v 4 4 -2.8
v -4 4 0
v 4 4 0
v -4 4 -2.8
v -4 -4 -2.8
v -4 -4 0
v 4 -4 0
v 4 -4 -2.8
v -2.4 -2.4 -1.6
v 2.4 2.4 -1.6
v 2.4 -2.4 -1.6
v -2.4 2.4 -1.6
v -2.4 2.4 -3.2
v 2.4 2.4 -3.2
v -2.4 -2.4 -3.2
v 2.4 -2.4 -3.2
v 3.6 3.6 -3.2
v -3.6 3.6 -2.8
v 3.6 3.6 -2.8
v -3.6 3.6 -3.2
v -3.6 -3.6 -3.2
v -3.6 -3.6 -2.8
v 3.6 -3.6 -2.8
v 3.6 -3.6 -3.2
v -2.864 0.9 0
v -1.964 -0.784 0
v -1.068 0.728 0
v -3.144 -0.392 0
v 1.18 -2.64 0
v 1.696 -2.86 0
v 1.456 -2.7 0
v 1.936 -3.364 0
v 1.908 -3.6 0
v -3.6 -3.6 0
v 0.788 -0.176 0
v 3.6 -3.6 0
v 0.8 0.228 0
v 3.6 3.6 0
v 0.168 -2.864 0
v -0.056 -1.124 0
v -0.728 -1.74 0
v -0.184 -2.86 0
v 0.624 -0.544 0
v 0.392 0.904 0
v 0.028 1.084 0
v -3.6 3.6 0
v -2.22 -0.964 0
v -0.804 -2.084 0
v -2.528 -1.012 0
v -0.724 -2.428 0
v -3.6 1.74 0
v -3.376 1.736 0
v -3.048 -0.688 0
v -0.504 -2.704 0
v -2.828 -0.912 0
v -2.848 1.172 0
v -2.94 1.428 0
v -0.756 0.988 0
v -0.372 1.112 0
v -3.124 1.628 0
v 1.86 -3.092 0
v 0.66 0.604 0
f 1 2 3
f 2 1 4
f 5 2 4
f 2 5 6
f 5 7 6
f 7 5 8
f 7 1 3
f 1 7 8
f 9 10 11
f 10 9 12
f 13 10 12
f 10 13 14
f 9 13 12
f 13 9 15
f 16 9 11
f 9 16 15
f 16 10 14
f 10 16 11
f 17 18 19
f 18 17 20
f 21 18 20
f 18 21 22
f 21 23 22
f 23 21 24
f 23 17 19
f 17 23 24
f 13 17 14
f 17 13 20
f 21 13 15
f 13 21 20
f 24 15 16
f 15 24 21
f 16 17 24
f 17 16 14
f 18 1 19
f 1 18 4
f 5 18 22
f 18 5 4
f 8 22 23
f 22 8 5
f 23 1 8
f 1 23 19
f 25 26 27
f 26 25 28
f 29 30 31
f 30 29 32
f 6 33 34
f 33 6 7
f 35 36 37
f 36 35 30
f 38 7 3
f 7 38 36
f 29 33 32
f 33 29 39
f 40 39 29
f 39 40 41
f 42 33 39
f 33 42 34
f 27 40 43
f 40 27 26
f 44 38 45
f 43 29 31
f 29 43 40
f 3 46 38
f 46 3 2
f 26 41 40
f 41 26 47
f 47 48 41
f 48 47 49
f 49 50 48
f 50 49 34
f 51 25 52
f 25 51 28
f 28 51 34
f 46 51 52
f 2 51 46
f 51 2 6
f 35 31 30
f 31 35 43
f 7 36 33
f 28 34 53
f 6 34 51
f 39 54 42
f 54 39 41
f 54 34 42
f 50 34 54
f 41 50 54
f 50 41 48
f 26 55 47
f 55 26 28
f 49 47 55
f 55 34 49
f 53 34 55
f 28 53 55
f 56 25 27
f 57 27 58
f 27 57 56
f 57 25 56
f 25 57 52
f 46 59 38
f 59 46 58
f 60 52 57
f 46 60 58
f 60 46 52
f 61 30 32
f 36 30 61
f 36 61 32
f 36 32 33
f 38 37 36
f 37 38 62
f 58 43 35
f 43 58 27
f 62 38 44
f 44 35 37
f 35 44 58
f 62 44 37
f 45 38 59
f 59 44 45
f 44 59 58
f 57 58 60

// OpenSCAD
// file: ../p/box5.scad
use <../lib.scad>
function ldraw_lib__box5() = [
// 0 Box with 5 Faces and All Edges
// 0 Name: box5.dat
// 0 Author: James Jessiman
// 0 !LDRAW_ORG Primitive UPDATE 2012-01
// 0 !LICENSE Licensed under CC BY 2.0 and CC BY 4.0 : see CAreadme.txt
// 
// 0 BFC CERTIFY CCW
  [0,"BFC","CERTIFY"],
  [0,"BFC","CCW"],
// 
// 0 !HISTORY 2002-04-03 [sbliss] Modified for BFC compliance
// 0 !HISTORY 2002-04-25 [PTadmin] Official Update 2002-02
// 0 !HISTORY 2007-06-24 [PTadmin] Header formatted for Contributor Agreement
// 0 !HISTORY 2008-07-01 [PTadmin] Official Update 2008-01
// 0 !HISTORY 2012-02-16 [Philo] Changed to CCW
// 0 !HISTORY 2012-03-30 [PTadmin] Official Update 2012-01
// 
// 
// 2 24 1 1 1 -1 1 1
  [2,24,1,1,1,-1,1,1],
// 2 24 -1 1 1 -1 1 -1
  [2,24,-1,1,1,-1,1,-1],
// 2 24 -1 1 -1 1 1 -1
  [2,24,-1,1,-1,1,1,-1],
// 2 24 1 1 -1 1 1 1
  [2,24,1,1,-1,1,1,1],
// 2 24 1 0 1 -1 0 1
  [2,24,1,0,1,-1,0,1],
// 2 24 -1 0 1 -1 0 -1
  [2,24,-1,0,1,-1,0,-1],
// 2 24 -1 0 -1 1 0 -1
  [2,24,-1,0,-1,1,0,-1],
// 2 24 1 0 -1 1 0 1
  [2,24,1,0,-1,1,0,1],
// 2 24 1 0 1 1 1 1
  [2,24,1,0,1,1,1,1],
// 2 24 -1 0 1 -1 1 1
  [2,24,-1,0,1,-1,1,1],
// 2 24 1 0 -1 1 1 -1
  [2,24,1,0,-1,1,1,-1],
// 2 24 -1 0 -1 -1 1 -1
  [2,24,-1,0,-1,-1,1,-1],
// 4 16 -1 1 1 1 1 1 1 1 -1 -1 1 -1
  [4,16,-1,1,1,1,1,1,1,1,-1,-1,1,-1],
// 4 16 -1 1 1 -1 0 1 1 0 1 1 1 1
  [4,16,-1,1,1,-1,0,1,1,0,1,1,1,1],
// 4 16 -1 1 -1 -1 0 -1 -1 0 1 -1 1 1
  [4,16,-1,1,-1,-1,0,-1,-1,0,1,-1,1,1],
// 4 16 1 1 -1 1 0 -1 -1 0 -1 -1 1 -1
  [4,16,1,1,-1,1,0,-1,-1,0,-1,-1,1,-1],
// 4 16 1 1 1 1 0 1 1 0 -1 1 1 -1
  [4,16,1,1,1,1,0,1,1,0,-1,1,1,-1],
];
module ldraw_lib__box5(step=0, col=false, unit=2/5, alt=false, line=0.2, solid=!$preview)
    makepoly(ldraw_lib__box5(), step=step, col=col, unit=unit, alt=alt, line=line, solid=solid);
ldraw_lib__box5(line=0.2);
// file: ../p/box4.scad
use <../lib.scad>
function ldraw_lib__box4() = [
// 0 Box with 4 Faces (2 Parallel Pairs) and All Edges
// 0 Name: box4.dat
// 0 Author: James Jessiman
// 0 !LDRAW_ORG Primitive UPDATE 2012-01
// 0 !LICENSE Licensed under CC BY 2.0 and CC BY 4.0 : see CAreadme.txt
// 
// 0 BFC CERTIFY CCW
  [0,"BFC","CERTIFY"],
  [0,"BFC","CCW"],
// 
// 0 !HISTORY 2002-04-03 [sbliss] Modified for BFC compliance
// 0 !HISTORY 2002-04-25 [PTadmin] Official Update 2002-02
// 0 !HISTORY 2007-06-24 [PTadmin] Header formatted for Contributor Agreement
// 0 !HISTORY 2008-07-01 [PTadmin] Official Update 2008-01
// 0 !HISTORY 2012-02-16 [Philo] Changed to CCW
// 0 !HISTORY 2012-03-30 [PTadmin] Official Update 2012-01
// 
// 
// 2 24 1 1 1 -1 1 1
  [2,24,1,1,1,-1,1,1],
// 2 24 -1 1 1 -1 1 -1
  [2,24,-1,1,1,-1,1,-1],
// 2 24 -1 1 -1 1 1 -1
  [2,24,-1,1,-1,1,1,-1],
// 2 24 1 1 -1 1 1 1
  [2,24,1,1,-1,1,1,1],
// 2 24 1 0 1 -1 0 1
  [2,24,1,0,1,-1,0,1],
// 2 24 -1 0 1 -1 0 -1
  [2,24,-1,0,1,-1,0,-1],
// 2 24 -1 0 -1 1 0 -1
  [2,24,-1,0,-1,1,0,-1],
// 2 24 1 0 -1 1 0 1
  [2,24,1,0,-1,1,0,1],
// 2 24 1 0 1 1 1 1
  [2,24,1,0,1,1,1,1],
// 2 24 -1 0 1 -1 1 1
  [2,24,-1,0,1,-1,1,1],
// 2 24 1 0 -1 1 1 -1
  [2,24,1,0,-1,1,1,-1],
// 2 24 -1 0 -1 -1 1 -1
  [2,24,-1,0,-1,-1,1,-1],
// 4 16 -1 1 1 -1 0 1 1 0 1 1 1 1
  [4,16,-1,1,1,-1,0,1,1,0,1,1,1,1],
// 4 16 -1 1 -1 -1 0 -1 -1 0 1 -1 1 1
  [4,16,-1,1,-1,-1,0,-1,-1,0,1,-1,1,1],
// 4 16 1 1 -1 1 0 -1 -1 0 -1 -1 1 -1
  [4,16,1,1,-1,1,0,-1,-1,0,-1,-1,1,-1],
// 4 16 1 1 1 1 0 1 1 0 -1 1 1 -1
  [4,16,1,1,1,1,0,1,1,0,-1,1,1,-1],
];
module ldraw_lib__box4(step=0, col=false, unit=2/5, alt=false, line=0.2, solid=!$preview)
    makepoly(ldraw_lib__box4(), step=step, col=col, unit=unit, alt=alt, line=line, solid=solid);
ldraw_lib__box4(line=0.2);
// file: s/3070bs01.scad
use <../../lib.scad>
use <../../p/box4.scad>
use <../../p/box5.scad>
function ldraw_lib__s__3070bs01() = [
// 0 ~Tile  1 x  1 with Groove without Top Face
// 0 Name: s\3070bs01.dat
// 0 Author: Chris Dee [cwdee]
// 0 !LDRAW_ORG Subpart UPDATE 2009-02
// 0 !LICENSE Licensed under CC BY 2.0 and CC BY 4.0 : see CAreadme.txt
// 
// 0 BFC CERTIFY CCW
  [0,"BFC","CERTIFY"],
  [0,"BFC","CCW"],
// 
// 0 !HISTORY 2009-09-03 [PTadmin] Official Update 2009-02
// 
// 
// 1 16 0 0 0 10 0 0 0 7 0 0 0 10 box4.dat
  [1,16,0,0,0,10,0,0,0,7,0,0,0,10, ldraw_lib__box4()],
// 0 BFC INVERTNEXT
  [0,"BFC","INVERTNEXT"],
// 1 16 0 8 0 6 0 0 0 -4 0 0 0 6 box5.dat
  [1,16,0,8,0,6,0,0,0,-4,0,0,0,6, ldraw_lib__box5()],
// 1 16 0 7 0 9 0 0 0 1 0 0 0 9 box4.dat
  [1,16,0,7,0,9,0,0,0,1,0,0,0,9, ldraw_lib__box4()],
// 
// 4 16 9 8 9 6 8 6 -6 8 6 -9 8 9
  [4,16,9,8,9,6,8,6,-6,8,6,-9,8,9],
// 4 16 -9 8 9 -6 8 6 -6 8 -6 -9 8 -9
  [4,16,-9,8,9,-6,8,6,-6,8,-6,-9,8,-9],
// 4 16 -9 8 -9 -6 8 -6 6 8 -6 9 8 -9
  [4,16,-9,8,-9,-6,8,-6,6,8,-6,9,8,-9],
// 4 16 9 8 -9 6 8 -6 6 8 6 9 8 9
  [4,16,9,8,-9,6,8,-6,6,8,6,9,8,9],
// 
// 4 16 10 7 10 9 7 9 -9 7 9 -10 7 10
  [4,16,10,7,10,9,7,9,-9,7,9,-10,7,10],
// 4 16 -10 7 10 -9 7 9 -9 7 -9 -10 7 -10
  [4,16,-10,7,10,-9,7,9,-9,7,-9,-10,7,-10],
// 4 16 -10 7 -10 -9 7 -9 9 7 -9 10 7 -10
  [4,16,-10,7,-10,-9,7,-9,9,7,-9,10,7,-10],
// 4 16 10 7 -10 9 7 -9 9 7 9 10 7 10
  [4,16,10,7,-10,9,7,-9,9,7,9,10,7,10],
// 0
];
module ldraw_lib__s__3070bs01(step=0, col=false, unit=2/5, alt=false, line=0.2, solid=!$preview)
    makepoly(ldraw_lib__s__3070bs01(), step=step, col=col, unit=unit, alt=alt, line=line, solid=solid);
ldraw_lib__s__3070bs01(line=0.2);
// main file
use <../lib.scad>
use <s/3070bs01.scad>
function ldraw_lib__3070bp0t() = [
// 0 Tile  1 x  1 with Bright Pink Splotch on Dark Turquoise Background Pattern
// 0 Name: 3070bp0t.dat
// 0 Author: Philippe Hurbain [Philo]
// 0 !LDRAW_ORG Part UPDATE 2022-01
// 0 !LICENSE Licensed under CC BY 2.0 and CC BY 4.0 : see CAreadme.txt
// 
// 0 BFC CERTIFY CCW
  [0,"BFC","CERTIFY"],
  [0,"BFC","CCW"],
// 
// 0 !KEYWORDS Bricklink 3070bpb151, Dots
// 
// 0 !HISTORY 2022-01-14 [PTadmin] Official Update 2022-01
// 
// 
// 1 16 0 0 0 1 0 0 0 1 0 0 0 1 s\3070bs01.dat
  [1,16,0,0,0,1,0,0,0,1,0,0,0,1, ldraw_lib__s__3070bs01()],
// 4 3 -7.16 0 2.25 -7.86 0 -0.98 -4.91 0 -1.96 -2.67 0 1.82
  [4,3,-7.16,0,2.25,-7.86,0,-0.98,-4.91,0,-1.96,-2.67,0,1.82],
// 4 29 3.64 0 -6.75 2.95 0 -6.6 4.84 0 -8.41 4.24 0 -7.15
  [4,29,3.64,0,-6.75,2.95,0,-6.6,4.84,0,-8.41,4.24,0,-7.15],
// 4 16 -10 0 -10 10 0 -10 4.77 0 -9 -9 0 -9
  [4,16,-10,0,-10,10,0,-10,4.77,0,-9,-9,0,-9],
// 4 3 1.97 0 -0.44 4.24 0 -7.15 9 0 -9 2 0 0.57
  [4,3,1.97,0,-0.44,4.24,0,-7.15,9,0,-9,2,0,0.57],
// 4 16 9 0 9 9 0 -9 10 0 -10 10 0 10
  [4,16,9,0,9,9,0,-9,10,0,-10,10,0,10],
// 4 29 2.95 0 -6.6 0.42 0 -7.16 4.77 0 -9 4.84 0 -8.41
  [4,29,2.95,0,-6.6,0.42,0,-7.16,4.77,0,-9,4.84,0,-8.41],
// 4 3 -0.14 0 -2.81 -1.82 0 -4.35 0.42 0 -7.16 2.95 0 -6.6
  [4,3,-0.14,0,-2.81,-1.82,0,-4.35,0.42,0,-7.16,2.95,0,-6.6],
// 4 29 -0.46 0 -7.15 -9 0 -9 4.77 0 -9 0.42 0 -7.16
  [4,29,-0.46,0,-7.15,-9,0,-9,4.77,0,-9,0.42,0,-7.16],
// 4 29 -2.67 0 1.82 -4.91 0 -1.96 -0.14 0 -2.81 1.56 0 -1.36
  [4,29,-2.67,0,1.82,-4.91,0,-1.96,-0.14,0,-2.81,1.56,0,-1.36],
// 3 3 0.98 0 2.26 9 0 9 0.07 0 2.71
  [3,3,0.98,0,2.26,9,0,9,0.07,0,2.71],
// 4 3 1.56 0 -1.36 -0.14 0 -2.81 2.95 0 -6.6 3.64 0 -6.75
  [4,3,1.56,0,-1.36,-0.14,0,-2.81,2.95,0,-6.6,3.64,0,-6.75],
// 4 16 -10 0 10 -9 0 9 9 0 9 10 0 10
  [4,16,-10,0,10,-9,0,9,9,0,9,10,0,10],
// 4 29 -1.82 0 -4.35 -0.14 0 -2.81 -4.91 0 -1.96 -5.55 0 -2.41
  [4,29,-1.82,0,-4.35,-0.14,0,-2.81,-4.91,0,-1.96,-5.55,0,-2.41],
// 4 29 -2.01 0 -5.21 -1.82 0 -4.35 -5.55 0 -2.41 -6.32 0 -2.53
  [4,29,-2.01,0,-5.21,-1.82,0,-4.35,-5.55,0,-2.41,-6.32,0,-2.53],
// 4 29 -1.81 0 -6.07 -2.01 0 -5.21 -6.32 0 -2.53 -9 0 -9
  [4,29,-1.81,0,-6.07,-2.01,0,-5.21,-6.32,0,-2.53,-9,0,-9],
// 4 29 -9 0 4.35 -7.86 0 -0.98 -7.16 0 2.25 -8.44 0 4.34
  [4,29,-9,0,4.35,-7.86,0,-0.98,-7.16,0,2.25,-8.44,0,4.34],
// 3 29 -7.86 0 -0.98 -9 0 4.35 -9 0 -9
  [3,29,-7.86,0,-0.98,-9,0,4.35,-9,0,-9],
// 3 3 -9 0 9 -9 0 4.35 -8.44 0 4.34
  [3,3,-9,0,9,-9,0,4.35,-8.44,0,4.34],
// 4 16 -9 0 4.35 -9 0 9 -10 0 10 -10 0 -10
  [4,16,-9,0,4.35,-9,0,9,-10,0,10,-10,0,-10],
// 4 3 1.97 0 -0.44 1.56 0 -1.36 3.64 0 -6.75 4.24 0 -7.15
  [4,3,1.97,0,-0.44,1.56,0,-1.36,3.64,0,-6.75,4.24,0,-7.15],
// 3 16 10 0 -10 9 0 -9 4.77 0 -9
  [3,16,10,0,-10,9,0,-9,4.77,0,-9],
// 3 29 -7.86 0 -0.98 -9 0 -9 -7.62 0 -1.72
  [3,29,-7.86,0,-0.98,-9,0,-9,-7.62,0,-1.72],
// 3 16 -10 0 -10 -9 0 -9 -9 0 4.35
  [3,16,-10,0,-10,-9,0,-9,-9,0,4.35],
// 4 3 -0.46 0 -7.15 0.42 0 -7.16 -1.82 0 -4.35 -1.26 0 -6.76
  [4,3,-0.46,0,-7.15,0.42,0,-7.16,-1.82,0,-4.35,-1.26,0,-6.76],
// 3 29 -1.26 0 -6.76 -9 0 -9 -0.46 0 -7.15
  [3,29,-1.26,0,-6.76,-9,0,-9,-0.46,0,-7.15],
// 3 29 -1.81 0 -6.07 -9 0 -9 -1.26 0 -6.76
  [3,29,-1.81,0,-6.07,-9,0,-9,-1.26,0,-6.76],
// 4 3 -1.81 0 -6.07 -1.26 0 -6.76 -1.82 0 -4.35 -2.01 0 -5.21
  [4,3,-1.81,0,-6.07,-1.26,0,-6.76,-1.82,0,-4.35,-2.01,0,-5.21],
// 4 3 -5.55 0 -2.41 -4.91 0 -1.96 -7.86 0 -0.98 -7.07 0 -2.28
  [4,3,-5.55,0,-2.41,-4.91,0,-1.96,-7.86,0,-0.98,-7.07,0,-2.28],
// 3 3 -6.32 0 -2.53 -5.55 0 -2.41 -7.07 0 -2.28
  [3,3,-6.32,0,-2.53,-5.55,0,-2.41,-7.07,0,-2.28],
// 3 29 -7.07 0 -2.28 -9 0 -9 -6.32 0 -2.53
  [3,29,-7.07,0,-2.28,-9,0,-9,-6.32,0,-2.53],
// 3 29 -7.62 0 -1.72 -9 0 -9 -7.07 0 -2.28
  [3,29,-7.62,0,-1.72,-9,0,-9,-7.07,0,-2.28],
// 3 3 -7.86 0 -0.98 -7.62 0 -1.72 -7.07 0 -2.28
  [3,3,-7.86,0,-0.98,-7.62,0,-1.72,-7.07,0,-2.28],
// 3 3 -7.12 0 2.93 -7.16 0 2.25 -2.67 0 1.82
  [3,3,-7.12,0,2.93,-7.16,0,2.25,-2.67,0,1.82],
// 4 3 -7.35 0 3.57 -7.12 0 2.93 -2.67 0 1.82 -1.89 0 2.47
  [4,3,-7.35,0,3.57,-7.12,0,2.93,-2.67,0,1.82,-1.89,0,2.47],
// 4 29 -8.44 0 4.34 -7.16 0 2.25 -7.12 0 2.93 -7.35 0 3.57
  [4,29,-8.44,0,4.34,-7.16,0,2.25,-7.12,0,2.93,-7.35,0,3.57],
// 4 3 -0.93 0 2.78 9 0 9 -9 0 9 -1.89 0 2.47
  [4,3,-0.93,0,2.78,9,0,9,-9,0,9,-1.89,0,2.47],
// 3 29 -7.81 0 4.07 -8.44 0 4.34 -7.35 0 3.57
  [3,29,-7.81,0,4.07,-8.44,0,4.34,-7.35,0,3.57],
// 4 3 -9 0 9 -8.44 0 4.34 -7.81 0 4.07 -1.89 0 2.47
  [4,3,-9,0,9,-8.44,0,4.34,-7.81,0,4.07,-1.89,0,2.47],
// 3 29 4.65 0 -7.73 4.24 0 -7.15 4.84 0 -8.41
  [3,29,4.65,0,-7.73,4.24,0,-7.15,4.84,0,-8.41],
// 3 3 9 0 -9 4.24 0 -7.15 4.65 0 -7.73
  [3,3,9,0,-9,4.24,0,-7.15,4.65,0,-7.73],
// 3 3 9 0 -9 4.65 0 -7.73 4.84 0 -8.41
  [3,3,9,0,-9,4.65,0,-7.73,4.84,0,-8.41],
// 3 3 9 0 -9 4.84 0 -8.41 4.77 0 -9
  [3,3,9,0,-9,4.84,0,-8.41,4.77,0,-9],
// 4 3 2 0 0.57 9 0 -9 9 0 9 1.65 0 1.51
  [4,3,2,0,0.57,9,0,-9,9,0,9,1.65,0,1.51],
// 4 29 -1.89 0 2.47 -2.67 0 1.82 1.56 0 -1.36 1.97 0 -0.44
  [4,29,-1.89,0,2.47,-2.67,0,1.82,1.56,0,-1.36,1.97,0,-0.44],
// 3 3 1.65 0 1.51 9 0 9 0.98 0 2.26
  [3,3,1.65,0,1.51,9,0,9,0.98,0,2.26],
// 4 29 1.97 0 -0.44 2 0 0.57 0.98 0 2.26 -1.89 0 2.47
  [4,29,1.97,0,-0.44,2,0,0.57,0.98,0,2.26,-1.89,0,2.47],
// 3 29 1.65 0 1.51 0.98 0 2.26 2 0 0.57
  [3,29,1.65,0,1.51,0.98,0,2.26,2,0,0.57],
// 3 3 0.07 0 2.71 9 0 9 -0.93 0 2.78
  [3,3,0.07,0,2.71,9,0,9,-0.93,0,2.78],
// 4 29 -1.89 0 2.47 0.98 0 2.26 0.07 0 2.71 -0.93 0 2.78
  [4,29,-1.89,0,2.47,0.98,0,2.26,0.07,0,2.71,-0.93,0,2.78],
// 3 3 -7.35 0 3.57 -1.89 0 2.47 -7.81 0 4.07
  [3,3,-7.35,0,3.57,-1.89,0,2.47,-7.81,0,4.07],
];
module ldraw_lib__3070bp0t(step=0, col=false, unit=2/5, alt=false, line=0.2, solid=!$preview)
    makepoly(ldraw_lib__3070bp0t(), step=step, col=col, unit=unit, alt=alt, line=line, solid=solid);
ldraw_lib__3070bp0t(line=0.2);
